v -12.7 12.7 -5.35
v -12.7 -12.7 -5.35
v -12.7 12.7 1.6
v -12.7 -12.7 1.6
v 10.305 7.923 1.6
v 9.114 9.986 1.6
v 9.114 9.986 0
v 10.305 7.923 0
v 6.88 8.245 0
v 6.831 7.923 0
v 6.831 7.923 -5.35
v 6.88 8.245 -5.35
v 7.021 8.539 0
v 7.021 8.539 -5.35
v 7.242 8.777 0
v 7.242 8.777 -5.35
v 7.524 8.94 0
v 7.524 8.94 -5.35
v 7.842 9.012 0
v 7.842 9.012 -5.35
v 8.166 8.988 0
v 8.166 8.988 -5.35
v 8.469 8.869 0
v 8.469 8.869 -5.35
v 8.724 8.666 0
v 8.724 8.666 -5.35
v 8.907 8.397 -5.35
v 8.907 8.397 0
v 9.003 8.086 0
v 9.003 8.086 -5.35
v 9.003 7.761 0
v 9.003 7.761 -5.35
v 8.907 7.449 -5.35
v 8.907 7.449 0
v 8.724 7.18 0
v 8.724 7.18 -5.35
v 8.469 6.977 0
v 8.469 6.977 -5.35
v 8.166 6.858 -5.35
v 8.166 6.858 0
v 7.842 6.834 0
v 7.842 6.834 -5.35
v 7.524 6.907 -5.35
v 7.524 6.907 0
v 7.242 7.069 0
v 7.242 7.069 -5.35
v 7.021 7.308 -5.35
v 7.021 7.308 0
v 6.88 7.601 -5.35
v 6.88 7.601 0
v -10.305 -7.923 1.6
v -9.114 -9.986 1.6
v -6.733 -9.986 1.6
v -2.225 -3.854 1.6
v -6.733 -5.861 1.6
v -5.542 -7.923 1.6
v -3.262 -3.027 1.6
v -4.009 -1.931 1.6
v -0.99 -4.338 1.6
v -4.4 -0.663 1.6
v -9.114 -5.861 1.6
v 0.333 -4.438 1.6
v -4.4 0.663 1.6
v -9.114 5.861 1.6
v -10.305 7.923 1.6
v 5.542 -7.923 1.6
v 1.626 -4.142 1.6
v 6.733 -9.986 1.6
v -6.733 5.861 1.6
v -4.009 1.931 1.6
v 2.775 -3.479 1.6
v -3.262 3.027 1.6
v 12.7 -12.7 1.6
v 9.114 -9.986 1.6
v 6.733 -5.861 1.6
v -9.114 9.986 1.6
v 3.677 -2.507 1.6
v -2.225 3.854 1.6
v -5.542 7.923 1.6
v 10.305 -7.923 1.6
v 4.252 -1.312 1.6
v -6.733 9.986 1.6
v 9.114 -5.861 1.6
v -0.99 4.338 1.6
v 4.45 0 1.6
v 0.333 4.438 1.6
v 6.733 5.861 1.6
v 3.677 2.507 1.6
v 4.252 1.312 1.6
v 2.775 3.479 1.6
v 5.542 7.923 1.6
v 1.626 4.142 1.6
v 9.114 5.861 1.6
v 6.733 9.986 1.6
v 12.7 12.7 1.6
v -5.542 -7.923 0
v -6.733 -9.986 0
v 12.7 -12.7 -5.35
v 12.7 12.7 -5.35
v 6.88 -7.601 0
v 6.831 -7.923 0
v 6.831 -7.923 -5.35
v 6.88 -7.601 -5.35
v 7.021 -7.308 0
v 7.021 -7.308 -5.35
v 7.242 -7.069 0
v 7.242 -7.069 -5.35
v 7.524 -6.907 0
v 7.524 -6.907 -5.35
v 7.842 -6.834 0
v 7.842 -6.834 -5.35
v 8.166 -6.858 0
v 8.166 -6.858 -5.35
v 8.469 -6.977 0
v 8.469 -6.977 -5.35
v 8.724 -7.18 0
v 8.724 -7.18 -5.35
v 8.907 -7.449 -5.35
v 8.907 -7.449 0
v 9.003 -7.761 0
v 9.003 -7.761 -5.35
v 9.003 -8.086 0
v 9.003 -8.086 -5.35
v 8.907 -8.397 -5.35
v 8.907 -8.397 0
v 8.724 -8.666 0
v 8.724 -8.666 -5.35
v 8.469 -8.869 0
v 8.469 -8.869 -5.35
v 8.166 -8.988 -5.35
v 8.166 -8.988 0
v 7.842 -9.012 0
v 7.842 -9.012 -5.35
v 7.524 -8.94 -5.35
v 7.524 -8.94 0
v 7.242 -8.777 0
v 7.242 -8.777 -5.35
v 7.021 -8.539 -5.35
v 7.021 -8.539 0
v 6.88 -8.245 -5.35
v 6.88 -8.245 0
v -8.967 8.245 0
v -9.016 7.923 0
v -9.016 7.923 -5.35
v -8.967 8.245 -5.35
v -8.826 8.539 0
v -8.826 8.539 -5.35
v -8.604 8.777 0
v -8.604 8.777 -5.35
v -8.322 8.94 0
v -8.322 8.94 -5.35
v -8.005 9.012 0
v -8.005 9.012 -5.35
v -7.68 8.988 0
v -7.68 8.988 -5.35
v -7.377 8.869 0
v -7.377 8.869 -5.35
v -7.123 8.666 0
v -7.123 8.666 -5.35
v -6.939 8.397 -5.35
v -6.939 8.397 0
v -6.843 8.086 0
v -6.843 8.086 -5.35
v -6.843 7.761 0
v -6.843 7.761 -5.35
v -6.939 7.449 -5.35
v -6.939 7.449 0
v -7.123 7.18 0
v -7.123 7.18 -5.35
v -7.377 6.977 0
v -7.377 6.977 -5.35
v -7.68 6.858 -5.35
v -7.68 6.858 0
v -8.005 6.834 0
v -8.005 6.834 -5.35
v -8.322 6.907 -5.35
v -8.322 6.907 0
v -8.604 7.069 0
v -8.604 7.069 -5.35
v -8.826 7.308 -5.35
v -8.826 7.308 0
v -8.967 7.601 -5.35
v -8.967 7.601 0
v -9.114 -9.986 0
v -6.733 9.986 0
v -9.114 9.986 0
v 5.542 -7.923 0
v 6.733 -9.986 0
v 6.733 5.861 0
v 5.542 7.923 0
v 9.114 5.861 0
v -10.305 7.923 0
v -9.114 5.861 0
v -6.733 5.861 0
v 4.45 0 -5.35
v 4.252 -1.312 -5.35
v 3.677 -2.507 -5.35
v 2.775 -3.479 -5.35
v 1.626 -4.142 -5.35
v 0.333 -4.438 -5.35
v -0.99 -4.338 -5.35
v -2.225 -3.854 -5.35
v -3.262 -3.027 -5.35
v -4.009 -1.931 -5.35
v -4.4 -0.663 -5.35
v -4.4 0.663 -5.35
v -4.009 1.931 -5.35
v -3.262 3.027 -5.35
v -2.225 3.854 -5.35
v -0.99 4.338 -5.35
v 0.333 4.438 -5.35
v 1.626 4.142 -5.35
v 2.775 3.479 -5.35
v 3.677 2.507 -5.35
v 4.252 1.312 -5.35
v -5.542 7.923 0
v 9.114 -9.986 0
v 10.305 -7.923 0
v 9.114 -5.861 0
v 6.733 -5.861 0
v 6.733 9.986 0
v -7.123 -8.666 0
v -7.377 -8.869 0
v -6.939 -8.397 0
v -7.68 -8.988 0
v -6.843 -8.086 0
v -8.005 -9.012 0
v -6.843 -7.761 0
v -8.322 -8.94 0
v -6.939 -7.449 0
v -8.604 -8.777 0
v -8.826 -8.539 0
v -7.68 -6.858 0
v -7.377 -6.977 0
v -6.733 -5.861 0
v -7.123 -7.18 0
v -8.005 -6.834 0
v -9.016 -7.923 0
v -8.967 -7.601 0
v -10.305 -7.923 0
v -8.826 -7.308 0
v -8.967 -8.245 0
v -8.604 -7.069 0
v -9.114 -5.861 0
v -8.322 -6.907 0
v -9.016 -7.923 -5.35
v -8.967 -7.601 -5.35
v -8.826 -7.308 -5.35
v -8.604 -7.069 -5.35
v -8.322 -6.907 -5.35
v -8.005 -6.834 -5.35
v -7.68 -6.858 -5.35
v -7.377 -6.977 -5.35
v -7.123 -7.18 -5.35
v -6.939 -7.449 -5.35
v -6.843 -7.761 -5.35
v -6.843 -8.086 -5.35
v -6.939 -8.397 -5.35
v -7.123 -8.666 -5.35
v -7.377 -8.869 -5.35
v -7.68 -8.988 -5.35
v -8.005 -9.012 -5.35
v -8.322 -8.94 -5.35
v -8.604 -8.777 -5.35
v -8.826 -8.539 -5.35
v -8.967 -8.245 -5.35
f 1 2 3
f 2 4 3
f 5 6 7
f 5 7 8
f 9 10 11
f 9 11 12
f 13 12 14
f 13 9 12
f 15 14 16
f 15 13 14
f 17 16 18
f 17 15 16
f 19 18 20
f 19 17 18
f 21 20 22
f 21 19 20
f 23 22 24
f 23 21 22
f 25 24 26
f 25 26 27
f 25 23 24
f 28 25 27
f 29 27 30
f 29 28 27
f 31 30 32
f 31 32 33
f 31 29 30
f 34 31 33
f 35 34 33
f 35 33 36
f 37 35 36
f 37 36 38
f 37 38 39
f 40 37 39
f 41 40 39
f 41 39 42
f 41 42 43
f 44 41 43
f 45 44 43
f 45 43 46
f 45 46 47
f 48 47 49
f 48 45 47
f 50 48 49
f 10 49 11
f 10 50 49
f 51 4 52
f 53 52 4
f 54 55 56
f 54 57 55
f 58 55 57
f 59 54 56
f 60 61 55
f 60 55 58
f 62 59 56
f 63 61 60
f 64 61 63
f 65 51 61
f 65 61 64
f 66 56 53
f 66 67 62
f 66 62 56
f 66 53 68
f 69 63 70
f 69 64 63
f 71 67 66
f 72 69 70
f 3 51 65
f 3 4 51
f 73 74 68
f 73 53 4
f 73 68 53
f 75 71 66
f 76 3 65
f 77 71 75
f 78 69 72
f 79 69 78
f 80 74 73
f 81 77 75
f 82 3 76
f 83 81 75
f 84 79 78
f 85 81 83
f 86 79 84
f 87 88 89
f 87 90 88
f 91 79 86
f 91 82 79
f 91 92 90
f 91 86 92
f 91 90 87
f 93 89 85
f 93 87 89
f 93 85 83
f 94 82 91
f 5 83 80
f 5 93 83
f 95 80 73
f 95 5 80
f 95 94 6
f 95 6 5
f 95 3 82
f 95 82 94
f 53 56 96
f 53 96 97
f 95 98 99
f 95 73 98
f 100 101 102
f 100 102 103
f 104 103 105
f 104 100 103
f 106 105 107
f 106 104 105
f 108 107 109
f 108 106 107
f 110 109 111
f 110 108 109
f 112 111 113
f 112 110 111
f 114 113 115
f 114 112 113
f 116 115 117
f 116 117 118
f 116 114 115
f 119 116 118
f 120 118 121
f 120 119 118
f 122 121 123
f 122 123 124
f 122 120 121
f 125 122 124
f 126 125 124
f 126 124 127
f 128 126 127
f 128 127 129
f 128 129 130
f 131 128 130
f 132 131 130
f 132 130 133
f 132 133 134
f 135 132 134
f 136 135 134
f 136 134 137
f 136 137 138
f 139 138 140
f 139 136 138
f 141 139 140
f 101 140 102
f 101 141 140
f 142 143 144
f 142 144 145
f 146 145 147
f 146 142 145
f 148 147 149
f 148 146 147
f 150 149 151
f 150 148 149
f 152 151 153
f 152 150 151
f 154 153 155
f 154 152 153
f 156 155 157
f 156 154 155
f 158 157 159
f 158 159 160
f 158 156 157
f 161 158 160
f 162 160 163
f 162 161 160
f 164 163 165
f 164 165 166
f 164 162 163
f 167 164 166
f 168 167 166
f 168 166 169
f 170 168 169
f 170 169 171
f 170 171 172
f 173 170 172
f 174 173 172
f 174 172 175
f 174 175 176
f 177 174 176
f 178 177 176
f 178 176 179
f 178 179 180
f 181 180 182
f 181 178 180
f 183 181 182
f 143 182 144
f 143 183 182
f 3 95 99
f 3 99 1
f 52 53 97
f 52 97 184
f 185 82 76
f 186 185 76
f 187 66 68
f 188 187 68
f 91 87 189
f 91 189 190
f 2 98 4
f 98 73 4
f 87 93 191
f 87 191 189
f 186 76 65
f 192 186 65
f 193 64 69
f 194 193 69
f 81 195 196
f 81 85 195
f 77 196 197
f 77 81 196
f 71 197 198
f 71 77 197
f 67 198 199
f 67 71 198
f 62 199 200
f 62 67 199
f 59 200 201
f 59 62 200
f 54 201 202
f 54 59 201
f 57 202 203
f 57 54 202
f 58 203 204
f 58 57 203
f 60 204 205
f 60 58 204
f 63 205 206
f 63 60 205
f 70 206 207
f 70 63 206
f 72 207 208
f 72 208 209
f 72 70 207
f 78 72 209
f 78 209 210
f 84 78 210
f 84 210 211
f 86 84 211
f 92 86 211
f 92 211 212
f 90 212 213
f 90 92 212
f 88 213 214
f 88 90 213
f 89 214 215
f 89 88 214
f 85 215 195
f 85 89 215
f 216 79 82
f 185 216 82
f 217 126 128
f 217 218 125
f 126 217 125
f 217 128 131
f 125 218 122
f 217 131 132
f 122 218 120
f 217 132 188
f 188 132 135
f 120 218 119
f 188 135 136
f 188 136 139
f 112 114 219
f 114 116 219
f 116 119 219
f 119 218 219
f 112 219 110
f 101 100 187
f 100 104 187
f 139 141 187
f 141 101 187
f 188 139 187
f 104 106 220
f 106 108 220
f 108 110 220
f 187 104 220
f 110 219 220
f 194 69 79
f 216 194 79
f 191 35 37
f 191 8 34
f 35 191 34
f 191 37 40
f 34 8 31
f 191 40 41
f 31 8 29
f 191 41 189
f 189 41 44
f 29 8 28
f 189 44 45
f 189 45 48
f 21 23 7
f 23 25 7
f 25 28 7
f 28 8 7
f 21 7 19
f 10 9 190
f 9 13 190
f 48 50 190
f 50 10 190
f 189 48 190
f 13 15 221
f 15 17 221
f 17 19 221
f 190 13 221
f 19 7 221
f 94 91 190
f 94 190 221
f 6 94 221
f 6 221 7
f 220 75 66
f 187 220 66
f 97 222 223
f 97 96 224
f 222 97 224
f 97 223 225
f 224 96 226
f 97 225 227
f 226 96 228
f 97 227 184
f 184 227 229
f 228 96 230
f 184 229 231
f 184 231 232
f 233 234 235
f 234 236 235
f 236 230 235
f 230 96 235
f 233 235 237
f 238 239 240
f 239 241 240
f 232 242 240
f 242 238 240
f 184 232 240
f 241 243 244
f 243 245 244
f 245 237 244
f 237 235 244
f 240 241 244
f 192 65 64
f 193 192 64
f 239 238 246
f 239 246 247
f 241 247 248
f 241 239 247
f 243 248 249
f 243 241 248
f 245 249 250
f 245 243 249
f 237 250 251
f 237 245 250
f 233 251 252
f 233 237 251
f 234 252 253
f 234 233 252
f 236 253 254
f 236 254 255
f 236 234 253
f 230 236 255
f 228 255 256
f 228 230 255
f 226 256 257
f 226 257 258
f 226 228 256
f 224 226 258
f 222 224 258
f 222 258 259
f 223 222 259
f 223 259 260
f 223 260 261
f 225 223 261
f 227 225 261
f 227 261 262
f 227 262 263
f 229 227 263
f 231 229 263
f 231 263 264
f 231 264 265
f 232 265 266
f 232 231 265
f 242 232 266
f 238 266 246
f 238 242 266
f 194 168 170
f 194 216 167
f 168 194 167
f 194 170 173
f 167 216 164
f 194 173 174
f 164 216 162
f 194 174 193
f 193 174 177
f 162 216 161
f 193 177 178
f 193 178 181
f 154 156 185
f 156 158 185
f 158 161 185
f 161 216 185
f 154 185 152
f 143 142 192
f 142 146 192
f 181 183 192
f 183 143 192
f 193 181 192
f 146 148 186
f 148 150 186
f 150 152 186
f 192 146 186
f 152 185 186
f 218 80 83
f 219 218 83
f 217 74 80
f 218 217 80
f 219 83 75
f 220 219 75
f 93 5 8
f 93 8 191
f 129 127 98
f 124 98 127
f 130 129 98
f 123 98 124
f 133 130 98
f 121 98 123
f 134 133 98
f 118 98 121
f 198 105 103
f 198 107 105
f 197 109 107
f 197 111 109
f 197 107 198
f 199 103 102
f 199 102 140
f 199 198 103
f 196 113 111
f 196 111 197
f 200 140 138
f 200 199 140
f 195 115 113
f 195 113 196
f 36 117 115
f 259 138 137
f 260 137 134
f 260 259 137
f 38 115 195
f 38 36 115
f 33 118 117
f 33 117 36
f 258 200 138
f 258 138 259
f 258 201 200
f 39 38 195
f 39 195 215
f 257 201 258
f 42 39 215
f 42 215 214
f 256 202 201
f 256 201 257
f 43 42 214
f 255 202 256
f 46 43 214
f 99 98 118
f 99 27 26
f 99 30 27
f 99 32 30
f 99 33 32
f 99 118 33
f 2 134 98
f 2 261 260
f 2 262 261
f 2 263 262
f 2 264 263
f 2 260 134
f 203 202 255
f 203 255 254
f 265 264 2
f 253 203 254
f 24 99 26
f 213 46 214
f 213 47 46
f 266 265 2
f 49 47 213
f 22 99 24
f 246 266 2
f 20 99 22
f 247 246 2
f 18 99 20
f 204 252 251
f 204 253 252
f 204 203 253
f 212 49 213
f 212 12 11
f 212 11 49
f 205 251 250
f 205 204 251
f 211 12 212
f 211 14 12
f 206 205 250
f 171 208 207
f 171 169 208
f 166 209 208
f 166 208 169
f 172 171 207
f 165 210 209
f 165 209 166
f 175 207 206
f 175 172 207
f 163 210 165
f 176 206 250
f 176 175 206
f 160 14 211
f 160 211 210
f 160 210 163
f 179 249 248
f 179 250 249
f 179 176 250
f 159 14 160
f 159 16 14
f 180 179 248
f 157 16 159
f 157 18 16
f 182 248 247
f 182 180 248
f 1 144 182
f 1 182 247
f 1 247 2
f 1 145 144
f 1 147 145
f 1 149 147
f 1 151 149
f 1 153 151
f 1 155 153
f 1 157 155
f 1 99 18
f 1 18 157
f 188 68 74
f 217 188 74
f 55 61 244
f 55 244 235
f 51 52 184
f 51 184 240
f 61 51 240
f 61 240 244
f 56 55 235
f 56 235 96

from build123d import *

# Parameters (mm, degrees)
SKETCH1_W           = 25.4
SKETCH1_H           = 25.4
BOSS_EXTRUDE1_DEPTH = 1.6
SKETCH2_R           = 4.45
CUT_EXTRUDE1_DEPTH  = 19.031638861
CUT_EXTRUDE2_DEPTH  = 19.031638861
SKETCH4_W           = 25.4
SKETCH4_H           = 25.4
SKETCH4_R           = 1.0922
SKETCH4_R_2         = 4.45
BOSS_EXTRUDE2_DEPTH = 5.35


with BuildPart() as part:
    # Sketch1 → Boss-Extrude1 (new body)
    with BuildSketch(Plane.XY):
        Rectangle(SKETCH1_W, SKETCH1_H)
    extrude(amount=BOSS_EXTRUDE1_DEPTH)

    # Sketch2 → Cut-Extrude1 (cut, through all)
    with BuildSketch(Plane.XY.offset(1.6)):
        Circle(SKETCH2_R)
    extrude(amount=-CUT_EXTRUDE1_DEPTH, mode=Mode.SUBTRACT)

    # Sketch3 → Cut-Extrude2 (cut, through all)
    with BuildSketch(Plane.XY.offset(1.6)):
        Polygon((9.113937588, 5.861089595), (6.732687588, 5.861089595), (5.542062588, 7.923312588), (6.732687588, 9.985535581), (9.113937588, 9.985535581), (10.304562588, 7.923312588), align=None)
        Polygon((-6.732687588, 5.861089595), (-5.542062588, 7.923312588), (-6.732687588, 9.985535581), (-9.113937588, 9.985535581), (-10.304562588, 7.923312588), (-9.113937588, 5.861089595), align=None)
        Polygon((6.732687588, -5.861089595), (5.542062588, -7.923312588), (6.732687588, -9.985535581), (9.113937588, -9.985535581), (10.304562588, -7.923312588), (9.113937588, -5.861089595), align=None)
        Polygon((-9.113937588, -5.861089595), (-6.732687588, -5.861089595), (-5.542062588, -7.923312588), (-6.732687588, -9.985535581), (-9.113937588, -9.985535581), (-10.304562588, -7.923312588), align=None)
    extrude(amount=-CUT_EXTRUDE2_DEPTH, mode=Mode.SUBTRACT)

    # Sketch4 → Boss-Extrude2 (add)
    with BuildSketch(Plane(origin=(0, 0, 0), x_dir=(-1, 0, 0), z_dir=(0, 0, -1))):
        Rectangle(SKETCH4_W, SKETCH4_H)
        with Locations((7.923312588, -7.923312588)):
            Circle(SKETCH4_R, mode=Mode.SUBTRACT)
        with Locations((-7.923312588, -7.923312588)):
            Circle(SKETCH4_R, mode=Mode.SUBTRACT)
        with Locations((7.923312588, 7.923312588)):
            Circle(SKETCH4_R, mode=Mode.SUBTRACT)
        with Locations((-7.923312588, 7.923312588)):
            Circle(SKETCH4_R, mode=Mode.SUBTRACT)
        with Locations(Location((0, 0, 0), (0, 0, 180))):
            Circle(SKETCH4_R_2, mode=Mode.SUBTRACT)
    extrude(amount=BOSS_EXTRUDE2_DEPTH)


solid = part.part
